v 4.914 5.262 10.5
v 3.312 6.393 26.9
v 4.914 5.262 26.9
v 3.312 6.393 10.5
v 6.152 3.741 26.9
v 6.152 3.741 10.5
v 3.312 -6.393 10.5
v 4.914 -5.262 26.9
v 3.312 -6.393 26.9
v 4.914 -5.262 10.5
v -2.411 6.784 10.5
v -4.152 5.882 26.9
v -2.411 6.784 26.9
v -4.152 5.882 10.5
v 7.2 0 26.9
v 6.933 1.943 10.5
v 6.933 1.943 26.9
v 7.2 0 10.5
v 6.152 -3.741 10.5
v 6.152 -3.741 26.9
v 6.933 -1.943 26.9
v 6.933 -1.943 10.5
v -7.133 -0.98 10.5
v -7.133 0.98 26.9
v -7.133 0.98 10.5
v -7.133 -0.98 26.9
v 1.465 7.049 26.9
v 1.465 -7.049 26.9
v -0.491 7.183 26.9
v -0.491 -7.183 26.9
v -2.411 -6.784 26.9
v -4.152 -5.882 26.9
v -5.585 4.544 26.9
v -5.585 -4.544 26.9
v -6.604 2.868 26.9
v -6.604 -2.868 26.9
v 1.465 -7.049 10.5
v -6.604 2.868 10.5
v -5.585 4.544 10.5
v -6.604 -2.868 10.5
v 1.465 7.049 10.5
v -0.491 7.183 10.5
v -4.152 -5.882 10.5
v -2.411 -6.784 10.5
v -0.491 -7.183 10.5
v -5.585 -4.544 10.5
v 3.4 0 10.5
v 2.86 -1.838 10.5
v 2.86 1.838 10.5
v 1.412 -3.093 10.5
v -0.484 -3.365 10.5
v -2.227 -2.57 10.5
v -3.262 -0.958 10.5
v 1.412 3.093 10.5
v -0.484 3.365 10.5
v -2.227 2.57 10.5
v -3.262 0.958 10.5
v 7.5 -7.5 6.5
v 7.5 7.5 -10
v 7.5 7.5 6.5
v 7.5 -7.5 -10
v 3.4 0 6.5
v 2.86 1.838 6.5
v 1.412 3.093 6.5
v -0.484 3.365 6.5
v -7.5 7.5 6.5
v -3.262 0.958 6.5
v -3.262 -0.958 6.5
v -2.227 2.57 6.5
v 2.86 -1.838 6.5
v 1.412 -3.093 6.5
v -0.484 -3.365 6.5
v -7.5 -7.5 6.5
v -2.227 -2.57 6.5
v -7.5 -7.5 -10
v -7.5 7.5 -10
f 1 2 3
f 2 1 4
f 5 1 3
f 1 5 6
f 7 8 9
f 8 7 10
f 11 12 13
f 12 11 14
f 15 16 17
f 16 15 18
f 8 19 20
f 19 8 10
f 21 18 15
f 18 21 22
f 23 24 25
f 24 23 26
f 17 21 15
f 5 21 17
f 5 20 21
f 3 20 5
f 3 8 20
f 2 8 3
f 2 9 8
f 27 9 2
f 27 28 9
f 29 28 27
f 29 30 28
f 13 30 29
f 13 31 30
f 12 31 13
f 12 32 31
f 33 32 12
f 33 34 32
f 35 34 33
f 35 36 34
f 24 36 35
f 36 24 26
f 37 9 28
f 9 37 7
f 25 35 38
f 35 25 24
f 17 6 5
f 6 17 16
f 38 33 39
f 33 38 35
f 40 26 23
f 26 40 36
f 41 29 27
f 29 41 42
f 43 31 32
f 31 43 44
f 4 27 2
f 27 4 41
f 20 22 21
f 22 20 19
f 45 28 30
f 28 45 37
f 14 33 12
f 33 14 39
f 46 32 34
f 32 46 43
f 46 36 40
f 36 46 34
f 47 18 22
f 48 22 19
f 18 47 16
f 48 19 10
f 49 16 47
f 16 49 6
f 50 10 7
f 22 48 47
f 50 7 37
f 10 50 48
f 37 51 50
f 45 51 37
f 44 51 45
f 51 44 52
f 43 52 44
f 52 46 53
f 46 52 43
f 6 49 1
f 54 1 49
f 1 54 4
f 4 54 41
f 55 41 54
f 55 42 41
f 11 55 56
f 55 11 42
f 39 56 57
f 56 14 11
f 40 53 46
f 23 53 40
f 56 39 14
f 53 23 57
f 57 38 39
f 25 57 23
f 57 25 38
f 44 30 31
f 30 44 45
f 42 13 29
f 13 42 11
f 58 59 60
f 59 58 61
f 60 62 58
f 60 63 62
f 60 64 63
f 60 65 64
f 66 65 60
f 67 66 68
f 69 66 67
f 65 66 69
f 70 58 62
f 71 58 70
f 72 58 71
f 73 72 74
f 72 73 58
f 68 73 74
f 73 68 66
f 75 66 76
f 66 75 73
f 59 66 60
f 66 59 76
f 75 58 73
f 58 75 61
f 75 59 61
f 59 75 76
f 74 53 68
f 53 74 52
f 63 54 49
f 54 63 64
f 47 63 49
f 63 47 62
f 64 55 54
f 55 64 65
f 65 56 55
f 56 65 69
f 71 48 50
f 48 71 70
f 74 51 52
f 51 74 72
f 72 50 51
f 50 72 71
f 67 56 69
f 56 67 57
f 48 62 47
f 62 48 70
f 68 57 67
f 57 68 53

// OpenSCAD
// file: flat-ui-colors.scad
flatui = [
    "#1abc9c",
    "#2ecc71",
    "#3498db",
    "#9b59b6",
    "#34495e",
    "#f1c40f",
    "#e67e22",
    "#e74c3c",
    "#ecf0f1",
    "#95a5a6",
];
// main file
include <./flat-ui-colors.scad>;

encoderScrewRadius = 6.8;
encoderScrewDepth = 20;

encoderKnobRadius = 14.4;
encoderKnobHeight = 16.4;

encoderBaseHeight = 6.5;
encoderBaseXY = 15;

encoderBaseSpace = 10;

module encoderKnob() {
    translate([0, 0, encoderBaseHeight + 4])
    color(flatui[1]) cylinder(h=encoderKnobHeight, d=encoderKnobRadius);
}

module encoderScrew() {
    translate([0, 0, encoderBaseHeight])
    color(flatui[2]) cylinder(h=encoderScrewDepth, d=encoderScrewRadius);
}

module encoderBase() {
    translate([-15/2, -15/2, 0])
    color(flatui[3]) cube([15, 15, encoderBaseHeight]);
}

module encoderBaseSpace() {
    translate([-15/2, -15/2, -encoderBaseSpace])
    color(flatui[4]) cube([15, 15, encoderBaseSpace]);
}

module rotaryEncoder(cutout=false) {
    encoderScrew();
    
    if (cutout == false) {
        encoderKnob();
        encoderBase();
        encoderBaseSpace();
    }
}

rotaryEncoder();

/*rotaryEncoder();

translate([20, 0, 0])
rotaryEncoder(true);*/
